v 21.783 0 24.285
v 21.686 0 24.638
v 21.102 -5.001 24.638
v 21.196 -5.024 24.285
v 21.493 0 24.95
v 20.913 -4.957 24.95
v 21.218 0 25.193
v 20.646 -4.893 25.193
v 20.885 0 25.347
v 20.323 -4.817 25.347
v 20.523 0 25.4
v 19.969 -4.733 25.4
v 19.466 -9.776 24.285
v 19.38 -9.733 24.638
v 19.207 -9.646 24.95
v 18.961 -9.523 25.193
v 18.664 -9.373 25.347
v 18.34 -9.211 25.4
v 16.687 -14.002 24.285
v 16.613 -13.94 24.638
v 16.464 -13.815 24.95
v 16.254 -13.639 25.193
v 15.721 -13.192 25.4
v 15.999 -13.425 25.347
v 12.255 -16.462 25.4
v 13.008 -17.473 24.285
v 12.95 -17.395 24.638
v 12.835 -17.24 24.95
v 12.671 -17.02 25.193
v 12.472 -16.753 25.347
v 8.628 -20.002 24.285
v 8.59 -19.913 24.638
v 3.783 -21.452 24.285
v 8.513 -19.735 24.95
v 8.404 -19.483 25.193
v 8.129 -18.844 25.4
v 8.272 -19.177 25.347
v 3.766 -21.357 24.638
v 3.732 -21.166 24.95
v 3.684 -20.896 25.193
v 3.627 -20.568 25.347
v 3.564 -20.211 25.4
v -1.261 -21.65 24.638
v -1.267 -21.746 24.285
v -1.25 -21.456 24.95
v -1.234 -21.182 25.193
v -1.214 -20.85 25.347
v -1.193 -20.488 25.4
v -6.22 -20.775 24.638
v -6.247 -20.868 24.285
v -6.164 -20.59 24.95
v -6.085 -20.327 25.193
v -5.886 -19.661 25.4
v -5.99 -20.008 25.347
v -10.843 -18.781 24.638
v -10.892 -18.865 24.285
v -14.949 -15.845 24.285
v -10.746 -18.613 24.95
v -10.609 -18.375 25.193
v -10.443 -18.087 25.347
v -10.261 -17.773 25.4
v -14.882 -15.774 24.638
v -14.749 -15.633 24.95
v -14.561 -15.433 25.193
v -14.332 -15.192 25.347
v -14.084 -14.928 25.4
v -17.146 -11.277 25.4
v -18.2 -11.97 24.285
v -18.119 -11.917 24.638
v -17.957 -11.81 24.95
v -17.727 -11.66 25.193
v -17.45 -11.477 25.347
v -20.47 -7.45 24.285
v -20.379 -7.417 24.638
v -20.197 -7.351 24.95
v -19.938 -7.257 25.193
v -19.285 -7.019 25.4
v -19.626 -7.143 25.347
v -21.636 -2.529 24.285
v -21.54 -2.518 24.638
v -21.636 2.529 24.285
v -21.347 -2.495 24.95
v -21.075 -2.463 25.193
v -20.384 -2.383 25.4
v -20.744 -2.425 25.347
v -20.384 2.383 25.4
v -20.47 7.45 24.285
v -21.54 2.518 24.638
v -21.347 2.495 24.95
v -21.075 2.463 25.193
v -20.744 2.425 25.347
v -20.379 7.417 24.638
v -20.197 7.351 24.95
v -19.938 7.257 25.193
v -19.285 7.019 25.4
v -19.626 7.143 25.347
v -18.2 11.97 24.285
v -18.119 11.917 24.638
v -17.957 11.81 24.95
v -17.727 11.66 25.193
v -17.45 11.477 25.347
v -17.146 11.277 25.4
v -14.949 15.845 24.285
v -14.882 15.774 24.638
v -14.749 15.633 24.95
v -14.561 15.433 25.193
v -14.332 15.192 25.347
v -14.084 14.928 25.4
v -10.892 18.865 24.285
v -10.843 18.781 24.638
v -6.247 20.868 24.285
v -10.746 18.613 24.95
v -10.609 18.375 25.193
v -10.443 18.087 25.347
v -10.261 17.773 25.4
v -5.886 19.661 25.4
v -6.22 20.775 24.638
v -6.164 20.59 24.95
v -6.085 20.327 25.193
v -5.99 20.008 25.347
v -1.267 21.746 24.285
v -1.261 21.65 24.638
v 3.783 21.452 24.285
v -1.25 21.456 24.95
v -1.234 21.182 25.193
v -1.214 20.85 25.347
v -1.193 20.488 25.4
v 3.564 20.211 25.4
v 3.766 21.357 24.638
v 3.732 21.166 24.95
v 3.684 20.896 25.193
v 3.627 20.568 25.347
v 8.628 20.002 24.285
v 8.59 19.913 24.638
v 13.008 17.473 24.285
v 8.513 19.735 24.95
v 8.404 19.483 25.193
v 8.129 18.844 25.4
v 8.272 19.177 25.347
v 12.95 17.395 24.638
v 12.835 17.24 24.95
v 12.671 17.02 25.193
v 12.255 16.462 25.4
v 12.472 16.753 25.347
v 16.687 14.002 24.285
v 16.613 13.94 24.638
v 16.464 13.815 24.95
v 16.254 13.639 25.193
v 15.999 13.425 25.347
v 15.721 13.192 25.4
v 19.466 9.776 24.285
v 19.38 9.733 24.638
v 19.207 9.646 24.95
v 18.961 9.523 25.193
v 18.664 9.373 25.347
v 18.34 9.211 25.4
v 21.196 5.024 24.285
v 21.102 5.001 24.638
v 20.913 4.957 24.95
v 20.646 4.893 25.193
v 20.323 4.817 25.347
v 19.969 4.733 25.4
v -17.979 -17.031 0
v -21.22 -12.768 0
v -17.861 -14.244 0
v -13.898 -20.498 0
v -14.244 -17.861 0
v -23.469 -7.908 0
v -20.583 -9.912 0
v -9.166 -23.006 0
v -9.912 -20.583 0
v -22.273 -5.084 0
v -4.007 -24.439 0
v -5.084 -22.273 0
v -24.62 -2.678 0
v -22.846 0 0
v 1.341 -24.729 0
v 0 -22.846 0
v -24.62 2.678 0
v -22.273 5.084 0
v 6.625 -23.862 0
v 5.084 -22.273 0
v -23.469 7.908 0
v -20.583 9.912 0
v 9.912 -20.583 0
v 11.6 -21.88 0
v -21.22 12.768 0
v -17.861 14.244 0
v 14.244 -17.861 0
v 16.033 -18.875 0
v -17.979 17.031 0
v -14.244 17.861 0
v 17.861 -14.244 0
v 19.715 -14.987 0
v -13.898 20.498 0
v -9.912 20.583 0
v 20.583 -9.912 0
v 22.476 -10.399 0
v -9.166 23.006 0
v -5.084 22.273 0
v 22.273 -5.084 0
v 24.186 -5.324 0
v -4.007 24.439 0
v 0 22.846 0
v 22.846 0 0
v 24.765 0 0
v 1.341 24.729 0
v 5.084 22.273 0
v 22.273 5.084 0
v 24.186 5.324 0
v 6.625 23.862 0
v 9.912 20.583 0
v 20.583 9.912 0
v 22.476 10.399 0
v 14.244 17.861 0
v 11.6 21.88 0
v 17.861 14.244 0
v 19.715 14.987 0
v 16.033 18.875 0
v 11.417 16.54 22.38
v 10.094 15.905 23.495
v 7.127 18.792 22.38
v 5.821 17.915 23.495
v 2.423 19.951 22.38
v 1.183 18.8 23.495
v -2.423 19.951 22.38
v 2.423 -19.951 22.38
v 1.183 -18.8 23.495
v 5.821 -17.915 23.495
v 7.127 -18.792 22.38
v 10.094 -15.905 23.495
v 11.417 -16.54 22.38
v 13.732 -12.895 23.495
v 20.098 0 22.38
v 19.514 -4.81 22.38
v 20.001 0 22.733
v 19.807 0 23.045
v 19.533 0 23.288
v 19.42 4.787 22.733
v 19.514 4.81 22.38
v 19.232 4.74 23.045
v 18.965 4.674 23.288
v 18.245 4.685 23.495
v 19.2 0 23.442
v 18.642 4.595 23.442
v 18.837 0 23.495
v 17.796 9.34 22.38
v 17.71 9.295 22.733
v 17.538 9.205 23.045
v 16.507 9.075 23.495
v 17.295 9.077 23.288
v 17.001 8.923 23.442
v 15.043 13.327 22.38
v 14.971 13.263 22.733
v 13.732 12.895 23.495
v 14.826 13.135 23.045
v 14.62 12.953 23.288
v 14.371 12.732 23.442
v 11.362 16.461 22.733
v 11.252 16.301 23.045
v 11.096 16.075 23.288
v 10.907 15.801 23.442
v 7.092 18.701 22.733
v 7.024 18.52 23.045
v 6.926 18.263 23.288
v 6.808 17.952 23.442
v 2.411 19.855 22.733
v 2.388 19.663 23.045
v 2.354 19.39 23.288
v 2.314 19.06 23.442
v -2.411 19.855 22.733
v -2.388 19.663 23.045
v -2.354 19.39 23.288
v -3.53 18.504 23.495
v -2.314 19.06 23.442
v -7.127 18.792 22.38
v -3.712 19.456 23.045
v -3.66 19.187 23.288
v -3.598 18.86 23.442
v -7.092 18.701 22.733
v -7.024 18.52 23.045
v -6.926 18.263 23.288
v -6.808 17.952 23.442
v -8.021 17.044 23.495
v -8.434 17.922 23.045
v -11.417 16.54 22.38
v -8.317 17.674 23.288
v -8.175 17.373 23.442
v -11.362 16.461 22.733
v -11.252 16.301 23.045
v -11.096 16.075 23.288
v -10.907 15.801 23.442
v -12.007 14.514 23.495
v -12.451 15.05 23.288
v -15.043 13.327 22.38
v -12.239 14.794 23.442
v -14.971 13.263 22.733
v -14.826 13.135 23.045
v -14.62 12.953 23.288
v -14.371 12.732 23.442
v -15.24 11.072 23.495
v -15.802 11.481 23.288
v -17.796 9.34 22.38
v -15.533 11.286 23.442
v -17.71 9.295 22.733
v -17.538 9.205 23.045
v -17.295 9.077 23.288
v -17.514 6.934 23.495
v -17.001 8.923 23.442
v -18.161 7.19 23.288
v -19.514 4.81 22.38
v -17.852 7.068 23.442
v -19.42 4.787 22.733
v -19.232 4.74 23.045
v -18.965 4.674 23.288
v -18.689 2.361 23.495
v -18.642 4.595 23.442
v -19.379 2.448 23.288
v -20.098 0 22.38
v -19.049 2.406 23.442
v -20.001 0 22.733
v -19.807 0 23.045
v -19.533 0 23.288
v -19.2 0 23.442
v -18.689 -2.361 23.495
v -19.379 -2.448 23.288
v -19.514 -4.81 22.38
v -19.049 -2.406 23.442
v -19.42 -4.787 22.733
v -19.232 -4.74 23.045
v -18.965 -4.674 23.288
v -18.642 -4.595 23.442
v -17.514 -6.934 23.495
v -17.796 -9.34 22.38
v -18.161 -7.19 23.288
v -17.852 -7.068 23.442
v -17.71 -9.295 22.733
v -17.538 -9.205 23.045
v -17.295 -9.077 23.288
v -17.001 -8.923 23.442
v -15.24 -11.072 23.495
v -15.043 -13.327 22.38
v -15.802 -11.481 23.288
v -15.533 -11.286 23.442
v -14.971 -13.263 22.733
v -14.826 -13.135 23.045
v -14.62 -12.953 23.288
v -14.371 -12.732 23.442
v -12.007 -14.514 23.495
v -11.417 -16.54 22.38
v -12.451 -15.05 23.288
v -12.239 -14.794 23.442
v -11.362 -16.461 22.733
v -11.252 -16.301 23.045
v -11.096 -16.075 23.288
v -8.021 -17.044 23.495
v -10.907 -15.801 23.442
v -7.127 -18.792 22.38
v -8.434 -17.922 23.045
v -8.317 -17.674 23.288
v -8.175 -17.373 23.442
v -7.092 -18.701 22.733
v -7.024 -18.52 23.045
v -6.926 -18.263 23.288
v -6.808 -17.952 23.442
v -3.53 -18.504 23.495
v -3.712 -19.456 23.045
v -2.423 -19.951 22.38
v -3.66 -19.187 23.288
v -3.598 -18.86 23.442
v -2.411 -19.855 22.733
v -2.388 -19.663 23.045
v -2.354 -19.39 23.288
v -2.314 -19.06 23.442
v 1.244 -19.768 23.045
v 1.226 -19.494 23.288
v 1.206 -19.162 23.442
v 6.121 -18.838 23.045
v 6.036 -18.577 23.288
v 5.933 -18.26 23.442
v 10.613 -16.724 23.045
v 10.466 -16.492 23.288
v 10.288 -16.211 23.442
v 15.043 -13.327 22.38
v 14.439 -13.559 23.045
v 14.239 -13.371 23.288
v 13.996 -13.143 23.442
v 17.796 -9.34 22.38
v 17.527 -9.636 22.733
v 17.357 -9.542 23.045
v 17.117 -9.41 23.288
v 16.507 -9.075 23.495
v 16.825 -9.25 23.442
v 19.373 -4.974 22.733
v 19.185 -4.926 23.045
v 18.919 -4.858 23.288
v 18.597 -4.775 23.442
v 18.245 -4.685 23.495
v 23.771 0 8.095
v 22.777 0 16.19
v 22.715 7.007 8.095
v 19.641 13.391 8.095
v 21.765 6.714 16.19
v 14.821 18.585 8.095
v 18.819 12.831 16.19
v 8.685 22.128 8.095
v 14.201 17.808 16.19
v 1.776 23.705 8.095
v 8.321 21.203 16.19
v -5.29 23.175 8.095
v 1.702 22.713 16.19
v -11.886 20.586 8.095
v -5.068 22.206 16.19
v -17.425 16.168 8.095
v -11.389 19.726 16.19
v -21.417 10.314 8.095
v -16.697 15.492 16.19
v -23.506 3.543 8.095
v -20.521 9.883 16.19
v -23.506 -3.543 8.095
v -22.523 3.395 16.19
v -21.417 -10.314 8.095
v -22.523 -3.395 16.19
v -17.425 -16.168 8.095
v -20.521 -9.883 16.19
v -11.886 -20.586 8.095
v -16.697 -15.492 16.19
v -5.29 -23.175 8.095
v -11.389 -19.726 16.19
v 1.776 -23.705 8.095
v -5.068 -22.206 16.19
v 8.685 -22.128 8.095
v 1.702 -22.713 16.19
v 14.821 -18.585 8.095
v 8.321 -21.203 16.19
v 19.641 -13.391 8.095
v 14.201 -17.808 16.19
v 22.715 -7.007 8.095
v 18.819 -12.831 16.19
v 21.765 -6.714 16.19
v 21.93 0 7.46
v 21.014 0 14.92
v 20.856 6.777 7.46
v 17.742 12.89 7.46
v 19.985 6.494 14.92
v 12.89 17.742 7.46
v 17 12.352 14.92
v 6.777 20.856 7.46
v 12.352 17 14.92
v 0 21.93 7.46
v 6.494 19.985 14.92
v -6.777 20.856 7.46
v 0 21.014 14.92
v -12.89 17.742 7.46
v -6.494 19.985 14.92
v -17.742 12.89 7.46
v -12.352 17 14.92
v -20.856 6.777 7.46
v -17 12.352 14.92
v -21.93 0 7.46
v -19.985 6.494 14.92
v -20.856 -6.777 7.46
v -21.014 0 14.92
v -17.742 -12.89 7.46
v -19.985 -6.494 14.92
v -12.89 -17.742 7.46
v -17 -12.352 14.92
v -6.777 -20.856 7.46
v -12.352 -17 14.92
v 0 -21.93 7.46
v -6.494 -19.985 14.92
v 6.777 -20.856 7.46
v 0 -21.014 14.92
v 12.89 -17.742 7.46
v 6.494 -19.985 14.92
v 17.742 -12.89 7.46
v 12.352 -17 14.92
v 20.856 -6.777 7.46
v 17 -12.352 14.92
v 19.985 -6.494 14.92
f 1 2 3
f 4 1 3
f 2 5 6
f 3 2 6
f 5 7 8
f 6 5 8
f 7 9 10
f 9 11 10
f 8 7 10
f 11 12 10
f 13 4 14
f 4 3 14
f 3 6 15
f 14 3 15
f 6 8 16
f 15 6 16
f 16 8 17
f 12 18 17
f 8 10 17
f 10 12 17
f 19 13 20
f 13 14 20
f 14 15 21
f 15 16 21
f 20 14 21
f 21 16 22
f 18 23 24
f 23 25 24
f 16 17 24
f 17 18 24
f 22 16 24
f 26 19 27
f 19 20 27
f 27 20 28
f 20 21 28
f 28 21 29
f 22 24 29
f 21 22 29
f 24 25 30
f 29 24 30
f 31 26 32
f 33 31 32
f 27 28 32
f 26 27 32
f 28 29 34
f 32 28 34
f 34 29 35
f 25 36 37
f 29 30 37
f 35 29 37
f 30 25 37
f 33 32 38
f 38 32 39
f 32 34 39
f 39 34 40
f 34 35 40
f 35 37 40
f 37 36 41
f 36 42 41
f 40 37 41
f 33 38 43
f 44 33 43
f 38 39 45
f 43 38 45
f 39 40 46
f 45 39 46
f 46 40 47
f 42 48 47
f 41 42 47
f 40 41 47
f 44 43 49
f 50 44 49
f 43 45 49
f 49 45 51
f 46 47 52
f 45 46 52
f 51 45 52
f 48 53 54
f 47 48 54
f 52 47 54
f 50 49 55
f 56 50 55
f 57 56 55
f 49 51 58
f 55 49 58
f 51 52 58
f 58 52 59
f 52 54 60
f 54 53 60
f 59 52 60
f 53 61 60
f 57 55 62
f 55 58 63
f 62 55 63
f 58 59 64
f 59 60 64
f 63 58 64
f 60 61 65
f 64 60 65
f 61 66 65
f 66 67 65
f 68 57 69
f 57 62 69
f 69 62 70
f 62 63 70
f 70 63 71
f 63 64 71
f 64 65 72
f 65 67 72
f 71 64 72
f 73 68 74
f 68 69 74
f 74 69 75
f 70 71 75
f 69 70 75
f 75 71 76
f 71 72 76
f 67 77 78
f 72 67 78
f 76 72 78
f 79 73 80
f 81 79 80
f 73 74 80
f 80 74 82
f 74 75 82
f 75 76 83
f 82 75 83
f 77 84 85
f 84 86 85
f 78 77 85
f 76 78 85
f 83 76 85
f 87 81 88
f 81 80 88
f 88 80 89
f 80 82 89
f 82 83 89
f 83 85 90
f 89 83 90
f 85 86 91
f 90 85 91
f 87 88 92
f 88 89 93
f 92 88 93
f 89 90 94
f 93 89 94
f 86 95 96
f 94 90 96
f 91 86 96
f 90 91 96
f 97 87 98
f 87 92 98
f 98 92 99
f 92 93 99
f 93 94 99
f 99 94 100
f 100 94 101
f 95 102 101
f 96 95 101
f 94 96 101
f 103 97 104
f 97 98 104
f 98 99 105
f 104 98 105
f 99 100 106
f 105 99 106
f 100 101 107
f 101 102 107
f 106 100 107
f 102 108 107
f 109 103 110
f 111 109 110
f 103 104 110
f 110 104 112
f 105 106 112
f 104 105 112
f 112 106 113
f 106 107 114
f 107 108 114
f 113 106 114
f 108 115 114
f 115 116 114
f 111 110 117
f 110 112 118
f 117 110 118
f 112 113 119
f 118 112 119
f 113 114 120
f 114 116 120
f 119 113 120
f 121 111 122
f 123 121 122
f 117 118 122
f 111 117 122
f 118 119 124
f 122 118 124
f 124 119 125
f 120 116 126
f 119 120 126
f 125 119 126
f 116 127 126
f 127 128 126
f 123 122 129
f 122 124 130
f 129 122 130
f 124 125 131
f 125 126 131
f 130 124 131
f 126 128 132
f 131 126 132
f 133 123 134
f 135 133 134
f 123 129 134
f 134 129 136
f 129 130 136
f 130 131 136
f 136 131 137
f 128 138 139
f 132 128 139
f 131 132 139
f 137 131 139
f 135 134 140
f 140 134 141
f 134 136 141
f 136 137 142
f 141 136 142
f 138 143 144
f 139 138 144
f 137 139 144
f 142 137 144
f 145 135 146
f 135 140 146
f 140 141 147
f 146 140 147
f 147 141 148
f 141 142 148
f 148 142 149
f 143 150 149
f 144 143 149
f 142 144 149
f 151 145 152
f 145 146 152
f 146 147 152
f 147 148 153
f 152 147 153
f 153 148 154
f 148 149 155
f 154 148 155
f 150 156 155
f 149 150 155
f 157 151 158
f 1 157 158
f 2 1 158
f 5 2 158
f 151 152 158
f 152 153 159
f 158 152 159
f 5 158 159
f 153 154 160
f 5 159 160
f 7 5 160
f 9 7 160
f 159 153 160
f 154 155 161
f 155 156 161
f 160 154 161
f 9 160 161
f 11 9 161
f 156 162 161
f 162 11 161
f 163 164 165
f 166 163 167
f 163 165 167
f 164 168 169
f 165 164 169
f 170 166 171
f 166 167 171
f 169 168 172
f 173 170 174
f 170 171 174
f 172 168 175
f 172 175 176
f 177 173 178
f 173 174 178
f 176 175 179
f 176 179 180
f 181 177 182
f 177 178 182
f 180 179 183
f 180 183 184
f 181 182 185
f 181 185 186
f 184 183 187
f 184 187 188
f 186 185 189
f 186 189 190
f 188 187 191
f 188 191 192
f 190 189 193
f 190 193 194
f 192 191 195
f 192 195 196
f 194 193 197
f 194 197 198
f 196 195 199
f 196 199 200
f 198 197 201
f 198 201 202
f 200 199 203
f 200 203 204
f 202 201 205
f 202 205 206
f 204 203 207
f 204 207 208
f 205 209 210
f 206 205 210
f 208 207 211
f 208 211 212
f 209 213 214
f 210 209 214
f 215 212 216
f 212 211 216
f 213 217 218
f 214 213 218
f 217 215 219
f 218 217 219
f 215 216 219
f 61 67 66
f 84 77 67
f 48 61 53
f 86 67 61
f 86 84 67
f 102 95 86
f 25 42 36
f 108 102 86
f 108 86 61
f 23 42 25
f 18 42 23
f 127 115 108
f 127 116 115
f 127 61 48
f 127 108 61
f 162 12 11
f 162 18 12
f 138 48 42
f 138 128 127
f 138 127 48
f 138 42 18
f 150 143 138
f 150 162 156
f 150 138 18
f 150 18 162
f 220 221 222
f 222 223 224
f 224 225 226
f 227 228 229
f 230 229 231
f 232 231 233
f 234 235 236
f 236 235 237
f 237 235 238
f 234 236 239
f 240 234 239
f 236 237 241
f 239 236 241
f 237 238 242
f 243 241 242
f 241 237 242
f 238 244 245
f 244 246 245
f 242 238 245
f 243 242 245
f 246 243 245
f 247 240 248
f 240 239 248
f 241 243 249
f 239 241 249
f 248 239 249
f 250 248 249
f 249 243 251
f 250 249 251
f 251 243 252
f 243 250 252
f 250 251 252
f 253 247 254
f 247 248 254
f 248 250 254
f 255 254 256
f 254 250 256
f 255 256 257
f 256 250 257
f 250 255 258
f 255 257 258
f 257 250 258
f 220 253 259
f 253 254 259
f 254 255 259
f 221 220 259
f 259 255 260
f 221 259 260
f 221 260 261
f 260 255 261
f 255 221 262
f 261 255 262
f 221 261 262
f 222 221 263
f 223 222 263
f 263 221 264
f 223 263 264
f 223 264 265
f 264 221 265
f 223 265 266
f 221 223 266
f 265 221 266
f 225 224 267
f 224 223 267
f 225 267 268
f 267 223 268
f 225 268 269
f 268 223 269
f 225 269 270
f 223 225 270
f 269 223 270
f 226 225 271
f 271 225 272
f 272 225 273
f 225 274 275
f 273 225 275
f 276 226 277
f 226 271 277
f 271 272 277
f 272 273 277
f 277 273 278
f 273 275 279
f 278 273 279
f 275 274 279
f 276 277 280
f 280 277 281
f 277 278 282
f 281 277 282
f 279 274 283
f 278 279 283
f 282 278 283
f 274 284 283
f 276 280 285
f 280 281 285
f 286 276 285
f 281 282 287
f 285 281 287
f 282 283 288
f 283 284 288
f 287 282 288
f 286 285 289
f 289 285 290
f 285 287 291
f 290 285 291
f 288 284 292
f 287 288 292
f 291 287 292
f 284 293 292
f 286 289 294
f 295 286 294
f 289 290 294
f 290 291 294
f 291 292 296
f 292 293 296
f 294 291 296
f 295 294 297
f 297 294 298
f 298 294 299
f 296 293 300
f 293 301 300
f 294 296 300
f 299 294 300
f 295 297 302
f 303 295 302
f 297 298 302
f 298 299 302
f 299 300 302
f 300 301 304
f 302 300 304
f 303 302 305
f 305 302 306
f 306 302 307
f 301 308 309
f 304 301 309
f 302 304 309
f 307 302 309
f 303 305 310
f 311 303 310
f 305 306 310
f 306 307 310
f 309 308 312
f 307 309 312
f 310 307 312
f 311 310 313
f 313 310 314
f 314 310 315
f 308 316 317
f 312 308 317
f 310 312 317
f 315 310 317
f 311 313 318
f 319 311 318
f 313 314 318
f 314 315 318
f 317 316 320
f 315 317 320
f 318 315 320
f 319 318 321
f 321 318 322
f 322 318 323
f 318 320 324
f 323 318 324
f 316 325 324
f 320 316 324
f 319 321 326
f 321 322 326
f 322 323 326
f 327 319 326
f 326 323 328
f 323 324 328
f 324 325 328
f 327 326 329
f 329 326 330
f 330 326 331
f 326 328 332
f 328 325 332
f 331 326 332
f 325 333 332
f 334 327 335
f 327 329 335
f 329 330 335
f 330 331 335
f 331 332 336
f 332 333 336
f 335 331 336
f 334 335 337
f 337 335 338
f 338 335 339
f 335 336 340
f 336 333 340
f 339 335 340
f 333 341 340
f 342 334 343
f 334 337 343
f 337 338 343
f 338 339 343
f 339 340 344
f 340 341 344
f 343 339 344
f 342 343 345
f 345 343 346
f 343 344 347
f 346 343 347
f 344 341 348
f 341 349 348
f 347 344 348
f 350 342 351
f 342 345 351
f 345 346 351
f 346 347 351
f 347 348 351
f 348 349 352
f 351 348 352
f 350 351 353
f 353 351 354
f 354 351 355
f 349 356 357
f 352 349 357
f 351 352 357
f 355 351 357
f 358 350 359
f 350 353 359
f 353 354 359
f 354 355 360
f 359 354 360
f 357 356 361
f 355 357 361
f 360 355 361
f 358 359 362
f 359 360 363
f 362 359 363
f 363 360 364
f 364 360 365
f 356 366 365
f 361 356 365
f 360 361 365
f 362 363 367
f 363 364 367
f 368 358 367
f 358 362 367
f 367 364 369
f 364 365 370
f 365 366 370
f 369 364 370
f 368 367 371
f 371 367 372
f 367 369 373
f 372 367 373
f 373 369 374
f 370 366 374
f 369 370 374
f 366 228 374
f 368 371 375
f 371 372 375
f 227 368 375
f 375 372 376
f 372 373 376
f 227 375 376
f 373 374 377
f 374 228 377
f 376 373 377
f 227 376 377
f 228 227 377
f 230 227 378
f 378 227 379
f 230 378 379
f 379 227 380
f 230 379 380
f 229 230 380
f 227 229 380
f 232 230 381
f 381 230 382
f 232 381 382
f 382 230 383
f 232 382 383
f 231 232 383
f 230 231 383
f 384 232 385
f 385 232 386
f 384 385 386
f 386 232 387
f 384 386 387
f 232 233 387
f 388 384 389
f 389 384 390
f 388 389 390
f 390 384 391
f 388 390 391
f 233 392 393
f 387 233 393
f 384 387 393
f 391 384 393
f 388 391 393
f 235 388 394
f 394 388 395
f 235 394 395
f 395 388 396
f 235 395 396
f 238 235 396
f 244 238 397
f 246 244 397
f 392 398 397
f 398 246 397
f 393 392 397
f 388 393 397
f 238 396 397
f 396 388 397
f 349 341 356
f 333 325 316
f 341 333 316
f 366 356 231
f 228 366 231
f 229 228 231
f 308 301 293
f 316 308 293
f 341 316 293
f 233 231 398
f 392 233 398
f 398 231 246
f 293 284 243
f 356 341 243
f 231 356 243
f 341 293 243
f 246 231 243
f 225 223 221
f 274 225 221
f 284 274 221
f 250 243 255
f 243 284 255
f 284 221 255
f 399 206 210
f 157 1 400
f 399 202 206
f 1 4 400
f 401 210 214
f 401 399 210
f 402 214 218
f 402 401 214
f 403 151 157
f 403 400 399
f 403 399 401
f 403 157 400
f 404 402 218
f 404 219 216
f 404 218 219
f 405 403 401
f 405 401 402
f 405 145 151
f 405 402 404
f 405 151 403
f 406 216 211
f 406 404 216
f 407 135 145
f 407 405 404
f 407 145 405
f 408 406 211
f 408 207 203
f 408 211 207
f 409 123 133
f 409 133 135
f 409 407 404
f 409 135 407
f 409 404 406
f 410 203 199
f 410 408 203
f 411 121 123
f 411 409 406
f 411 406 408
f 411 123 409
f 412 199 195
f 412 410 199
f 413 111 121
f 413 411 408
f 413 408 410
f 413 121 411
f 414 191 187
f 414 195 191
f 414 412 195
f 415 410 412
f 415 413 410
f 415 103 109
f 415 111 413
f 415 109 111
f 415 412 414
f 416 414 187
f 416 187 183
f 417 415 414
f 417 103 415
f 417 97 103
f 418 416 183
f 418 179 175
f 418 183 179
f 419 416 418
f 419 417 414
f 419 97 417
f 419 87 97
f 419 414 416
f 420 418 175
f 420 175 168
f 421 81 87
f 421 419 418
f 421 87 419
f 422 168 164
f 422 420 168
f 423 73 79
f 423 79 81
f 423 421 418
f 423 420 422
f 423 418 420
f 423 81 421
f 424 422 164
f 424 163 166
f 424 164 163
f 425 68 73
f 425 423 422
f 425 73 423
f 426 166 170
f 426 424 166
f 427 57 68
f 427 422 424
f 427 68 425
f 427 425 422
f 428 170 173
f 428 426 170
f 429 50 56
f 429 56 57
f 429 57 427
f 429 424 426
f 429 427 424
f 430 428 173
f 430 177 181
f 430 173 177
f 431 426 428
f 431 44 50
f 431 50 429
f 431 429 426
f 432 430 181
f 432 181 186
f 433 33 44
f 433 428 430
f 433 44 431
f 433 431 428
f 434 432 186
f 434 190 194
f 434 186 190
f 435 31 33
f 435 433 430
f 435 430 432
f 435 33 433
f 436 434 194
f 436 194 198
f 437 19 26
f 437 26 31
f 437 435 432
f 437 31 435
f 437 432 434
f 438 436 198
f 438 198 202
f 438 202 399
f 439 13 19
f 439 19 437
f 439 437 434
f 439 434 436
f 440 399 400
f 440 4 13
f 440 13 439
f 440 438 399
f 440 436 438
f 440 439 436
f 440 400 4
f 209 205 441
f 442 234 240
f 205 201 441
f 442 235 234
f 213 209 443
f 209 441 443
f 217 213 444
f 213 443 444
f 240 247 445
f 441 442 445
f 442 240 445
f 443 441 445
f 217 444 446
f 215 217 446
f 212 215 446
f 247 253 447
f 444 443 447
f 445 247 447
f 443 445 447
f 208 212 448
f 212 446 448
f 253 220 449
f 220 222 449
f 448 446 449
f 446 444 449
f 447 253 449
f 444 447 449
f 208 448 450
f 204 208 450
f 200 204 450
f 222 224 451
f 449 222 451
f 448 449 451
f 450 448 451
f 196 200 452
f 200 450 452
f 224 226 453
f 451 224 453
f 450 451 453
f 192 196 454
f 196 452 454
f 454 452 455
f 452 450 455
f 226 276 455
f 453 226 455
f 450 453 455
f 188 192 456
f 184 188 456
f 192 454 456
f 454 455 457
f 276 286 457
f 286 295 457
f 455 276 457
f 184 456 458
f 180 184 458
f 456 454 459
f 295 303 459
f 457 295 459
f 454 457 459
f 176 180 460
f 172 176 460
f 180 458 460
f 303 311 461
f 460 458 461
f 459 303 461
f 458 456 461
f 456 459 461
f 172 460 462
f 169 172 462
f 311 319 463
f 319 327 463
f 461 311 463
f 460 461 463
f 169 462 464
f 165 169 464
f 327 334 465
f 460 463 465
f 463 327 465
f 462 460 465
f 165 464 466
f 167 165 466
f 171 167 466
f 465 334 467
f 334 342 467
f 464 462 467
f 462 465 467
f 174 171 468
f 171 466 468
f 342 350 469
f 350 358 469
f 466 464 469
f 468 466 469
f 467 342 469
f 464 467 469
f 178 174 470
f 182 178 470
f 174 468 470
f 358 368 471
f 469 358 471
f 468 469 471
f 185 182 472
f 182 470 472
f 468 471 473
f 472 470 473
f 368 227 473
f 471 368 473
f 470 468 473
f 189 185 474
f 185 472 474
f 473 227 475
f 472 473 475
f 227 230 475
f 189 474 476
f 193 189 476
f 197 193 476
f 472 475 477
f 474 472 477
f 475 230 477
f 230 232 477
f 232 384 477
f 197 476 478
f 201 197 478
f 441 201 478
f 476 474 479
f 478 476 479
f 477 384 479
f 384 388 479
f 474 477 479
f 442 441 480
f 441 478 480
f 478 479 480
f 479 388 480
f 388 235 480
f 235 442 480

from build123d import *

# Parameters (mm, degrees)
F0_R     = 24.765
F1_DEPTH = 25.4
F1_TAPER = 7
F2_T     = -1.905
F3_R     = 1.27


with BuildPart() as f1:
    # F0 (on Top) → F1 (new body)
    with BuildSketch(Plane.XY):
        Circle(F0_R)
    extrude(amount=F1_DEPTH, taper=F1_TAPER)

    # F2
    f2_openings = [f1.faces().sort_by_distance(p)[0] for p in [
        (0, 0, 0),
    ]]
    offset(amount=F2_T, openings=f2_openings)

    # F3
    f3_edges = [f1.edges().sort_by_distance(p)[0] for p in [
        (-19.960871, 0, 23.495),
        (-21.646272, 0, 25.4),
    ]]
    fillet(f3_edges, radius=F3_R)


solid = f1.part
